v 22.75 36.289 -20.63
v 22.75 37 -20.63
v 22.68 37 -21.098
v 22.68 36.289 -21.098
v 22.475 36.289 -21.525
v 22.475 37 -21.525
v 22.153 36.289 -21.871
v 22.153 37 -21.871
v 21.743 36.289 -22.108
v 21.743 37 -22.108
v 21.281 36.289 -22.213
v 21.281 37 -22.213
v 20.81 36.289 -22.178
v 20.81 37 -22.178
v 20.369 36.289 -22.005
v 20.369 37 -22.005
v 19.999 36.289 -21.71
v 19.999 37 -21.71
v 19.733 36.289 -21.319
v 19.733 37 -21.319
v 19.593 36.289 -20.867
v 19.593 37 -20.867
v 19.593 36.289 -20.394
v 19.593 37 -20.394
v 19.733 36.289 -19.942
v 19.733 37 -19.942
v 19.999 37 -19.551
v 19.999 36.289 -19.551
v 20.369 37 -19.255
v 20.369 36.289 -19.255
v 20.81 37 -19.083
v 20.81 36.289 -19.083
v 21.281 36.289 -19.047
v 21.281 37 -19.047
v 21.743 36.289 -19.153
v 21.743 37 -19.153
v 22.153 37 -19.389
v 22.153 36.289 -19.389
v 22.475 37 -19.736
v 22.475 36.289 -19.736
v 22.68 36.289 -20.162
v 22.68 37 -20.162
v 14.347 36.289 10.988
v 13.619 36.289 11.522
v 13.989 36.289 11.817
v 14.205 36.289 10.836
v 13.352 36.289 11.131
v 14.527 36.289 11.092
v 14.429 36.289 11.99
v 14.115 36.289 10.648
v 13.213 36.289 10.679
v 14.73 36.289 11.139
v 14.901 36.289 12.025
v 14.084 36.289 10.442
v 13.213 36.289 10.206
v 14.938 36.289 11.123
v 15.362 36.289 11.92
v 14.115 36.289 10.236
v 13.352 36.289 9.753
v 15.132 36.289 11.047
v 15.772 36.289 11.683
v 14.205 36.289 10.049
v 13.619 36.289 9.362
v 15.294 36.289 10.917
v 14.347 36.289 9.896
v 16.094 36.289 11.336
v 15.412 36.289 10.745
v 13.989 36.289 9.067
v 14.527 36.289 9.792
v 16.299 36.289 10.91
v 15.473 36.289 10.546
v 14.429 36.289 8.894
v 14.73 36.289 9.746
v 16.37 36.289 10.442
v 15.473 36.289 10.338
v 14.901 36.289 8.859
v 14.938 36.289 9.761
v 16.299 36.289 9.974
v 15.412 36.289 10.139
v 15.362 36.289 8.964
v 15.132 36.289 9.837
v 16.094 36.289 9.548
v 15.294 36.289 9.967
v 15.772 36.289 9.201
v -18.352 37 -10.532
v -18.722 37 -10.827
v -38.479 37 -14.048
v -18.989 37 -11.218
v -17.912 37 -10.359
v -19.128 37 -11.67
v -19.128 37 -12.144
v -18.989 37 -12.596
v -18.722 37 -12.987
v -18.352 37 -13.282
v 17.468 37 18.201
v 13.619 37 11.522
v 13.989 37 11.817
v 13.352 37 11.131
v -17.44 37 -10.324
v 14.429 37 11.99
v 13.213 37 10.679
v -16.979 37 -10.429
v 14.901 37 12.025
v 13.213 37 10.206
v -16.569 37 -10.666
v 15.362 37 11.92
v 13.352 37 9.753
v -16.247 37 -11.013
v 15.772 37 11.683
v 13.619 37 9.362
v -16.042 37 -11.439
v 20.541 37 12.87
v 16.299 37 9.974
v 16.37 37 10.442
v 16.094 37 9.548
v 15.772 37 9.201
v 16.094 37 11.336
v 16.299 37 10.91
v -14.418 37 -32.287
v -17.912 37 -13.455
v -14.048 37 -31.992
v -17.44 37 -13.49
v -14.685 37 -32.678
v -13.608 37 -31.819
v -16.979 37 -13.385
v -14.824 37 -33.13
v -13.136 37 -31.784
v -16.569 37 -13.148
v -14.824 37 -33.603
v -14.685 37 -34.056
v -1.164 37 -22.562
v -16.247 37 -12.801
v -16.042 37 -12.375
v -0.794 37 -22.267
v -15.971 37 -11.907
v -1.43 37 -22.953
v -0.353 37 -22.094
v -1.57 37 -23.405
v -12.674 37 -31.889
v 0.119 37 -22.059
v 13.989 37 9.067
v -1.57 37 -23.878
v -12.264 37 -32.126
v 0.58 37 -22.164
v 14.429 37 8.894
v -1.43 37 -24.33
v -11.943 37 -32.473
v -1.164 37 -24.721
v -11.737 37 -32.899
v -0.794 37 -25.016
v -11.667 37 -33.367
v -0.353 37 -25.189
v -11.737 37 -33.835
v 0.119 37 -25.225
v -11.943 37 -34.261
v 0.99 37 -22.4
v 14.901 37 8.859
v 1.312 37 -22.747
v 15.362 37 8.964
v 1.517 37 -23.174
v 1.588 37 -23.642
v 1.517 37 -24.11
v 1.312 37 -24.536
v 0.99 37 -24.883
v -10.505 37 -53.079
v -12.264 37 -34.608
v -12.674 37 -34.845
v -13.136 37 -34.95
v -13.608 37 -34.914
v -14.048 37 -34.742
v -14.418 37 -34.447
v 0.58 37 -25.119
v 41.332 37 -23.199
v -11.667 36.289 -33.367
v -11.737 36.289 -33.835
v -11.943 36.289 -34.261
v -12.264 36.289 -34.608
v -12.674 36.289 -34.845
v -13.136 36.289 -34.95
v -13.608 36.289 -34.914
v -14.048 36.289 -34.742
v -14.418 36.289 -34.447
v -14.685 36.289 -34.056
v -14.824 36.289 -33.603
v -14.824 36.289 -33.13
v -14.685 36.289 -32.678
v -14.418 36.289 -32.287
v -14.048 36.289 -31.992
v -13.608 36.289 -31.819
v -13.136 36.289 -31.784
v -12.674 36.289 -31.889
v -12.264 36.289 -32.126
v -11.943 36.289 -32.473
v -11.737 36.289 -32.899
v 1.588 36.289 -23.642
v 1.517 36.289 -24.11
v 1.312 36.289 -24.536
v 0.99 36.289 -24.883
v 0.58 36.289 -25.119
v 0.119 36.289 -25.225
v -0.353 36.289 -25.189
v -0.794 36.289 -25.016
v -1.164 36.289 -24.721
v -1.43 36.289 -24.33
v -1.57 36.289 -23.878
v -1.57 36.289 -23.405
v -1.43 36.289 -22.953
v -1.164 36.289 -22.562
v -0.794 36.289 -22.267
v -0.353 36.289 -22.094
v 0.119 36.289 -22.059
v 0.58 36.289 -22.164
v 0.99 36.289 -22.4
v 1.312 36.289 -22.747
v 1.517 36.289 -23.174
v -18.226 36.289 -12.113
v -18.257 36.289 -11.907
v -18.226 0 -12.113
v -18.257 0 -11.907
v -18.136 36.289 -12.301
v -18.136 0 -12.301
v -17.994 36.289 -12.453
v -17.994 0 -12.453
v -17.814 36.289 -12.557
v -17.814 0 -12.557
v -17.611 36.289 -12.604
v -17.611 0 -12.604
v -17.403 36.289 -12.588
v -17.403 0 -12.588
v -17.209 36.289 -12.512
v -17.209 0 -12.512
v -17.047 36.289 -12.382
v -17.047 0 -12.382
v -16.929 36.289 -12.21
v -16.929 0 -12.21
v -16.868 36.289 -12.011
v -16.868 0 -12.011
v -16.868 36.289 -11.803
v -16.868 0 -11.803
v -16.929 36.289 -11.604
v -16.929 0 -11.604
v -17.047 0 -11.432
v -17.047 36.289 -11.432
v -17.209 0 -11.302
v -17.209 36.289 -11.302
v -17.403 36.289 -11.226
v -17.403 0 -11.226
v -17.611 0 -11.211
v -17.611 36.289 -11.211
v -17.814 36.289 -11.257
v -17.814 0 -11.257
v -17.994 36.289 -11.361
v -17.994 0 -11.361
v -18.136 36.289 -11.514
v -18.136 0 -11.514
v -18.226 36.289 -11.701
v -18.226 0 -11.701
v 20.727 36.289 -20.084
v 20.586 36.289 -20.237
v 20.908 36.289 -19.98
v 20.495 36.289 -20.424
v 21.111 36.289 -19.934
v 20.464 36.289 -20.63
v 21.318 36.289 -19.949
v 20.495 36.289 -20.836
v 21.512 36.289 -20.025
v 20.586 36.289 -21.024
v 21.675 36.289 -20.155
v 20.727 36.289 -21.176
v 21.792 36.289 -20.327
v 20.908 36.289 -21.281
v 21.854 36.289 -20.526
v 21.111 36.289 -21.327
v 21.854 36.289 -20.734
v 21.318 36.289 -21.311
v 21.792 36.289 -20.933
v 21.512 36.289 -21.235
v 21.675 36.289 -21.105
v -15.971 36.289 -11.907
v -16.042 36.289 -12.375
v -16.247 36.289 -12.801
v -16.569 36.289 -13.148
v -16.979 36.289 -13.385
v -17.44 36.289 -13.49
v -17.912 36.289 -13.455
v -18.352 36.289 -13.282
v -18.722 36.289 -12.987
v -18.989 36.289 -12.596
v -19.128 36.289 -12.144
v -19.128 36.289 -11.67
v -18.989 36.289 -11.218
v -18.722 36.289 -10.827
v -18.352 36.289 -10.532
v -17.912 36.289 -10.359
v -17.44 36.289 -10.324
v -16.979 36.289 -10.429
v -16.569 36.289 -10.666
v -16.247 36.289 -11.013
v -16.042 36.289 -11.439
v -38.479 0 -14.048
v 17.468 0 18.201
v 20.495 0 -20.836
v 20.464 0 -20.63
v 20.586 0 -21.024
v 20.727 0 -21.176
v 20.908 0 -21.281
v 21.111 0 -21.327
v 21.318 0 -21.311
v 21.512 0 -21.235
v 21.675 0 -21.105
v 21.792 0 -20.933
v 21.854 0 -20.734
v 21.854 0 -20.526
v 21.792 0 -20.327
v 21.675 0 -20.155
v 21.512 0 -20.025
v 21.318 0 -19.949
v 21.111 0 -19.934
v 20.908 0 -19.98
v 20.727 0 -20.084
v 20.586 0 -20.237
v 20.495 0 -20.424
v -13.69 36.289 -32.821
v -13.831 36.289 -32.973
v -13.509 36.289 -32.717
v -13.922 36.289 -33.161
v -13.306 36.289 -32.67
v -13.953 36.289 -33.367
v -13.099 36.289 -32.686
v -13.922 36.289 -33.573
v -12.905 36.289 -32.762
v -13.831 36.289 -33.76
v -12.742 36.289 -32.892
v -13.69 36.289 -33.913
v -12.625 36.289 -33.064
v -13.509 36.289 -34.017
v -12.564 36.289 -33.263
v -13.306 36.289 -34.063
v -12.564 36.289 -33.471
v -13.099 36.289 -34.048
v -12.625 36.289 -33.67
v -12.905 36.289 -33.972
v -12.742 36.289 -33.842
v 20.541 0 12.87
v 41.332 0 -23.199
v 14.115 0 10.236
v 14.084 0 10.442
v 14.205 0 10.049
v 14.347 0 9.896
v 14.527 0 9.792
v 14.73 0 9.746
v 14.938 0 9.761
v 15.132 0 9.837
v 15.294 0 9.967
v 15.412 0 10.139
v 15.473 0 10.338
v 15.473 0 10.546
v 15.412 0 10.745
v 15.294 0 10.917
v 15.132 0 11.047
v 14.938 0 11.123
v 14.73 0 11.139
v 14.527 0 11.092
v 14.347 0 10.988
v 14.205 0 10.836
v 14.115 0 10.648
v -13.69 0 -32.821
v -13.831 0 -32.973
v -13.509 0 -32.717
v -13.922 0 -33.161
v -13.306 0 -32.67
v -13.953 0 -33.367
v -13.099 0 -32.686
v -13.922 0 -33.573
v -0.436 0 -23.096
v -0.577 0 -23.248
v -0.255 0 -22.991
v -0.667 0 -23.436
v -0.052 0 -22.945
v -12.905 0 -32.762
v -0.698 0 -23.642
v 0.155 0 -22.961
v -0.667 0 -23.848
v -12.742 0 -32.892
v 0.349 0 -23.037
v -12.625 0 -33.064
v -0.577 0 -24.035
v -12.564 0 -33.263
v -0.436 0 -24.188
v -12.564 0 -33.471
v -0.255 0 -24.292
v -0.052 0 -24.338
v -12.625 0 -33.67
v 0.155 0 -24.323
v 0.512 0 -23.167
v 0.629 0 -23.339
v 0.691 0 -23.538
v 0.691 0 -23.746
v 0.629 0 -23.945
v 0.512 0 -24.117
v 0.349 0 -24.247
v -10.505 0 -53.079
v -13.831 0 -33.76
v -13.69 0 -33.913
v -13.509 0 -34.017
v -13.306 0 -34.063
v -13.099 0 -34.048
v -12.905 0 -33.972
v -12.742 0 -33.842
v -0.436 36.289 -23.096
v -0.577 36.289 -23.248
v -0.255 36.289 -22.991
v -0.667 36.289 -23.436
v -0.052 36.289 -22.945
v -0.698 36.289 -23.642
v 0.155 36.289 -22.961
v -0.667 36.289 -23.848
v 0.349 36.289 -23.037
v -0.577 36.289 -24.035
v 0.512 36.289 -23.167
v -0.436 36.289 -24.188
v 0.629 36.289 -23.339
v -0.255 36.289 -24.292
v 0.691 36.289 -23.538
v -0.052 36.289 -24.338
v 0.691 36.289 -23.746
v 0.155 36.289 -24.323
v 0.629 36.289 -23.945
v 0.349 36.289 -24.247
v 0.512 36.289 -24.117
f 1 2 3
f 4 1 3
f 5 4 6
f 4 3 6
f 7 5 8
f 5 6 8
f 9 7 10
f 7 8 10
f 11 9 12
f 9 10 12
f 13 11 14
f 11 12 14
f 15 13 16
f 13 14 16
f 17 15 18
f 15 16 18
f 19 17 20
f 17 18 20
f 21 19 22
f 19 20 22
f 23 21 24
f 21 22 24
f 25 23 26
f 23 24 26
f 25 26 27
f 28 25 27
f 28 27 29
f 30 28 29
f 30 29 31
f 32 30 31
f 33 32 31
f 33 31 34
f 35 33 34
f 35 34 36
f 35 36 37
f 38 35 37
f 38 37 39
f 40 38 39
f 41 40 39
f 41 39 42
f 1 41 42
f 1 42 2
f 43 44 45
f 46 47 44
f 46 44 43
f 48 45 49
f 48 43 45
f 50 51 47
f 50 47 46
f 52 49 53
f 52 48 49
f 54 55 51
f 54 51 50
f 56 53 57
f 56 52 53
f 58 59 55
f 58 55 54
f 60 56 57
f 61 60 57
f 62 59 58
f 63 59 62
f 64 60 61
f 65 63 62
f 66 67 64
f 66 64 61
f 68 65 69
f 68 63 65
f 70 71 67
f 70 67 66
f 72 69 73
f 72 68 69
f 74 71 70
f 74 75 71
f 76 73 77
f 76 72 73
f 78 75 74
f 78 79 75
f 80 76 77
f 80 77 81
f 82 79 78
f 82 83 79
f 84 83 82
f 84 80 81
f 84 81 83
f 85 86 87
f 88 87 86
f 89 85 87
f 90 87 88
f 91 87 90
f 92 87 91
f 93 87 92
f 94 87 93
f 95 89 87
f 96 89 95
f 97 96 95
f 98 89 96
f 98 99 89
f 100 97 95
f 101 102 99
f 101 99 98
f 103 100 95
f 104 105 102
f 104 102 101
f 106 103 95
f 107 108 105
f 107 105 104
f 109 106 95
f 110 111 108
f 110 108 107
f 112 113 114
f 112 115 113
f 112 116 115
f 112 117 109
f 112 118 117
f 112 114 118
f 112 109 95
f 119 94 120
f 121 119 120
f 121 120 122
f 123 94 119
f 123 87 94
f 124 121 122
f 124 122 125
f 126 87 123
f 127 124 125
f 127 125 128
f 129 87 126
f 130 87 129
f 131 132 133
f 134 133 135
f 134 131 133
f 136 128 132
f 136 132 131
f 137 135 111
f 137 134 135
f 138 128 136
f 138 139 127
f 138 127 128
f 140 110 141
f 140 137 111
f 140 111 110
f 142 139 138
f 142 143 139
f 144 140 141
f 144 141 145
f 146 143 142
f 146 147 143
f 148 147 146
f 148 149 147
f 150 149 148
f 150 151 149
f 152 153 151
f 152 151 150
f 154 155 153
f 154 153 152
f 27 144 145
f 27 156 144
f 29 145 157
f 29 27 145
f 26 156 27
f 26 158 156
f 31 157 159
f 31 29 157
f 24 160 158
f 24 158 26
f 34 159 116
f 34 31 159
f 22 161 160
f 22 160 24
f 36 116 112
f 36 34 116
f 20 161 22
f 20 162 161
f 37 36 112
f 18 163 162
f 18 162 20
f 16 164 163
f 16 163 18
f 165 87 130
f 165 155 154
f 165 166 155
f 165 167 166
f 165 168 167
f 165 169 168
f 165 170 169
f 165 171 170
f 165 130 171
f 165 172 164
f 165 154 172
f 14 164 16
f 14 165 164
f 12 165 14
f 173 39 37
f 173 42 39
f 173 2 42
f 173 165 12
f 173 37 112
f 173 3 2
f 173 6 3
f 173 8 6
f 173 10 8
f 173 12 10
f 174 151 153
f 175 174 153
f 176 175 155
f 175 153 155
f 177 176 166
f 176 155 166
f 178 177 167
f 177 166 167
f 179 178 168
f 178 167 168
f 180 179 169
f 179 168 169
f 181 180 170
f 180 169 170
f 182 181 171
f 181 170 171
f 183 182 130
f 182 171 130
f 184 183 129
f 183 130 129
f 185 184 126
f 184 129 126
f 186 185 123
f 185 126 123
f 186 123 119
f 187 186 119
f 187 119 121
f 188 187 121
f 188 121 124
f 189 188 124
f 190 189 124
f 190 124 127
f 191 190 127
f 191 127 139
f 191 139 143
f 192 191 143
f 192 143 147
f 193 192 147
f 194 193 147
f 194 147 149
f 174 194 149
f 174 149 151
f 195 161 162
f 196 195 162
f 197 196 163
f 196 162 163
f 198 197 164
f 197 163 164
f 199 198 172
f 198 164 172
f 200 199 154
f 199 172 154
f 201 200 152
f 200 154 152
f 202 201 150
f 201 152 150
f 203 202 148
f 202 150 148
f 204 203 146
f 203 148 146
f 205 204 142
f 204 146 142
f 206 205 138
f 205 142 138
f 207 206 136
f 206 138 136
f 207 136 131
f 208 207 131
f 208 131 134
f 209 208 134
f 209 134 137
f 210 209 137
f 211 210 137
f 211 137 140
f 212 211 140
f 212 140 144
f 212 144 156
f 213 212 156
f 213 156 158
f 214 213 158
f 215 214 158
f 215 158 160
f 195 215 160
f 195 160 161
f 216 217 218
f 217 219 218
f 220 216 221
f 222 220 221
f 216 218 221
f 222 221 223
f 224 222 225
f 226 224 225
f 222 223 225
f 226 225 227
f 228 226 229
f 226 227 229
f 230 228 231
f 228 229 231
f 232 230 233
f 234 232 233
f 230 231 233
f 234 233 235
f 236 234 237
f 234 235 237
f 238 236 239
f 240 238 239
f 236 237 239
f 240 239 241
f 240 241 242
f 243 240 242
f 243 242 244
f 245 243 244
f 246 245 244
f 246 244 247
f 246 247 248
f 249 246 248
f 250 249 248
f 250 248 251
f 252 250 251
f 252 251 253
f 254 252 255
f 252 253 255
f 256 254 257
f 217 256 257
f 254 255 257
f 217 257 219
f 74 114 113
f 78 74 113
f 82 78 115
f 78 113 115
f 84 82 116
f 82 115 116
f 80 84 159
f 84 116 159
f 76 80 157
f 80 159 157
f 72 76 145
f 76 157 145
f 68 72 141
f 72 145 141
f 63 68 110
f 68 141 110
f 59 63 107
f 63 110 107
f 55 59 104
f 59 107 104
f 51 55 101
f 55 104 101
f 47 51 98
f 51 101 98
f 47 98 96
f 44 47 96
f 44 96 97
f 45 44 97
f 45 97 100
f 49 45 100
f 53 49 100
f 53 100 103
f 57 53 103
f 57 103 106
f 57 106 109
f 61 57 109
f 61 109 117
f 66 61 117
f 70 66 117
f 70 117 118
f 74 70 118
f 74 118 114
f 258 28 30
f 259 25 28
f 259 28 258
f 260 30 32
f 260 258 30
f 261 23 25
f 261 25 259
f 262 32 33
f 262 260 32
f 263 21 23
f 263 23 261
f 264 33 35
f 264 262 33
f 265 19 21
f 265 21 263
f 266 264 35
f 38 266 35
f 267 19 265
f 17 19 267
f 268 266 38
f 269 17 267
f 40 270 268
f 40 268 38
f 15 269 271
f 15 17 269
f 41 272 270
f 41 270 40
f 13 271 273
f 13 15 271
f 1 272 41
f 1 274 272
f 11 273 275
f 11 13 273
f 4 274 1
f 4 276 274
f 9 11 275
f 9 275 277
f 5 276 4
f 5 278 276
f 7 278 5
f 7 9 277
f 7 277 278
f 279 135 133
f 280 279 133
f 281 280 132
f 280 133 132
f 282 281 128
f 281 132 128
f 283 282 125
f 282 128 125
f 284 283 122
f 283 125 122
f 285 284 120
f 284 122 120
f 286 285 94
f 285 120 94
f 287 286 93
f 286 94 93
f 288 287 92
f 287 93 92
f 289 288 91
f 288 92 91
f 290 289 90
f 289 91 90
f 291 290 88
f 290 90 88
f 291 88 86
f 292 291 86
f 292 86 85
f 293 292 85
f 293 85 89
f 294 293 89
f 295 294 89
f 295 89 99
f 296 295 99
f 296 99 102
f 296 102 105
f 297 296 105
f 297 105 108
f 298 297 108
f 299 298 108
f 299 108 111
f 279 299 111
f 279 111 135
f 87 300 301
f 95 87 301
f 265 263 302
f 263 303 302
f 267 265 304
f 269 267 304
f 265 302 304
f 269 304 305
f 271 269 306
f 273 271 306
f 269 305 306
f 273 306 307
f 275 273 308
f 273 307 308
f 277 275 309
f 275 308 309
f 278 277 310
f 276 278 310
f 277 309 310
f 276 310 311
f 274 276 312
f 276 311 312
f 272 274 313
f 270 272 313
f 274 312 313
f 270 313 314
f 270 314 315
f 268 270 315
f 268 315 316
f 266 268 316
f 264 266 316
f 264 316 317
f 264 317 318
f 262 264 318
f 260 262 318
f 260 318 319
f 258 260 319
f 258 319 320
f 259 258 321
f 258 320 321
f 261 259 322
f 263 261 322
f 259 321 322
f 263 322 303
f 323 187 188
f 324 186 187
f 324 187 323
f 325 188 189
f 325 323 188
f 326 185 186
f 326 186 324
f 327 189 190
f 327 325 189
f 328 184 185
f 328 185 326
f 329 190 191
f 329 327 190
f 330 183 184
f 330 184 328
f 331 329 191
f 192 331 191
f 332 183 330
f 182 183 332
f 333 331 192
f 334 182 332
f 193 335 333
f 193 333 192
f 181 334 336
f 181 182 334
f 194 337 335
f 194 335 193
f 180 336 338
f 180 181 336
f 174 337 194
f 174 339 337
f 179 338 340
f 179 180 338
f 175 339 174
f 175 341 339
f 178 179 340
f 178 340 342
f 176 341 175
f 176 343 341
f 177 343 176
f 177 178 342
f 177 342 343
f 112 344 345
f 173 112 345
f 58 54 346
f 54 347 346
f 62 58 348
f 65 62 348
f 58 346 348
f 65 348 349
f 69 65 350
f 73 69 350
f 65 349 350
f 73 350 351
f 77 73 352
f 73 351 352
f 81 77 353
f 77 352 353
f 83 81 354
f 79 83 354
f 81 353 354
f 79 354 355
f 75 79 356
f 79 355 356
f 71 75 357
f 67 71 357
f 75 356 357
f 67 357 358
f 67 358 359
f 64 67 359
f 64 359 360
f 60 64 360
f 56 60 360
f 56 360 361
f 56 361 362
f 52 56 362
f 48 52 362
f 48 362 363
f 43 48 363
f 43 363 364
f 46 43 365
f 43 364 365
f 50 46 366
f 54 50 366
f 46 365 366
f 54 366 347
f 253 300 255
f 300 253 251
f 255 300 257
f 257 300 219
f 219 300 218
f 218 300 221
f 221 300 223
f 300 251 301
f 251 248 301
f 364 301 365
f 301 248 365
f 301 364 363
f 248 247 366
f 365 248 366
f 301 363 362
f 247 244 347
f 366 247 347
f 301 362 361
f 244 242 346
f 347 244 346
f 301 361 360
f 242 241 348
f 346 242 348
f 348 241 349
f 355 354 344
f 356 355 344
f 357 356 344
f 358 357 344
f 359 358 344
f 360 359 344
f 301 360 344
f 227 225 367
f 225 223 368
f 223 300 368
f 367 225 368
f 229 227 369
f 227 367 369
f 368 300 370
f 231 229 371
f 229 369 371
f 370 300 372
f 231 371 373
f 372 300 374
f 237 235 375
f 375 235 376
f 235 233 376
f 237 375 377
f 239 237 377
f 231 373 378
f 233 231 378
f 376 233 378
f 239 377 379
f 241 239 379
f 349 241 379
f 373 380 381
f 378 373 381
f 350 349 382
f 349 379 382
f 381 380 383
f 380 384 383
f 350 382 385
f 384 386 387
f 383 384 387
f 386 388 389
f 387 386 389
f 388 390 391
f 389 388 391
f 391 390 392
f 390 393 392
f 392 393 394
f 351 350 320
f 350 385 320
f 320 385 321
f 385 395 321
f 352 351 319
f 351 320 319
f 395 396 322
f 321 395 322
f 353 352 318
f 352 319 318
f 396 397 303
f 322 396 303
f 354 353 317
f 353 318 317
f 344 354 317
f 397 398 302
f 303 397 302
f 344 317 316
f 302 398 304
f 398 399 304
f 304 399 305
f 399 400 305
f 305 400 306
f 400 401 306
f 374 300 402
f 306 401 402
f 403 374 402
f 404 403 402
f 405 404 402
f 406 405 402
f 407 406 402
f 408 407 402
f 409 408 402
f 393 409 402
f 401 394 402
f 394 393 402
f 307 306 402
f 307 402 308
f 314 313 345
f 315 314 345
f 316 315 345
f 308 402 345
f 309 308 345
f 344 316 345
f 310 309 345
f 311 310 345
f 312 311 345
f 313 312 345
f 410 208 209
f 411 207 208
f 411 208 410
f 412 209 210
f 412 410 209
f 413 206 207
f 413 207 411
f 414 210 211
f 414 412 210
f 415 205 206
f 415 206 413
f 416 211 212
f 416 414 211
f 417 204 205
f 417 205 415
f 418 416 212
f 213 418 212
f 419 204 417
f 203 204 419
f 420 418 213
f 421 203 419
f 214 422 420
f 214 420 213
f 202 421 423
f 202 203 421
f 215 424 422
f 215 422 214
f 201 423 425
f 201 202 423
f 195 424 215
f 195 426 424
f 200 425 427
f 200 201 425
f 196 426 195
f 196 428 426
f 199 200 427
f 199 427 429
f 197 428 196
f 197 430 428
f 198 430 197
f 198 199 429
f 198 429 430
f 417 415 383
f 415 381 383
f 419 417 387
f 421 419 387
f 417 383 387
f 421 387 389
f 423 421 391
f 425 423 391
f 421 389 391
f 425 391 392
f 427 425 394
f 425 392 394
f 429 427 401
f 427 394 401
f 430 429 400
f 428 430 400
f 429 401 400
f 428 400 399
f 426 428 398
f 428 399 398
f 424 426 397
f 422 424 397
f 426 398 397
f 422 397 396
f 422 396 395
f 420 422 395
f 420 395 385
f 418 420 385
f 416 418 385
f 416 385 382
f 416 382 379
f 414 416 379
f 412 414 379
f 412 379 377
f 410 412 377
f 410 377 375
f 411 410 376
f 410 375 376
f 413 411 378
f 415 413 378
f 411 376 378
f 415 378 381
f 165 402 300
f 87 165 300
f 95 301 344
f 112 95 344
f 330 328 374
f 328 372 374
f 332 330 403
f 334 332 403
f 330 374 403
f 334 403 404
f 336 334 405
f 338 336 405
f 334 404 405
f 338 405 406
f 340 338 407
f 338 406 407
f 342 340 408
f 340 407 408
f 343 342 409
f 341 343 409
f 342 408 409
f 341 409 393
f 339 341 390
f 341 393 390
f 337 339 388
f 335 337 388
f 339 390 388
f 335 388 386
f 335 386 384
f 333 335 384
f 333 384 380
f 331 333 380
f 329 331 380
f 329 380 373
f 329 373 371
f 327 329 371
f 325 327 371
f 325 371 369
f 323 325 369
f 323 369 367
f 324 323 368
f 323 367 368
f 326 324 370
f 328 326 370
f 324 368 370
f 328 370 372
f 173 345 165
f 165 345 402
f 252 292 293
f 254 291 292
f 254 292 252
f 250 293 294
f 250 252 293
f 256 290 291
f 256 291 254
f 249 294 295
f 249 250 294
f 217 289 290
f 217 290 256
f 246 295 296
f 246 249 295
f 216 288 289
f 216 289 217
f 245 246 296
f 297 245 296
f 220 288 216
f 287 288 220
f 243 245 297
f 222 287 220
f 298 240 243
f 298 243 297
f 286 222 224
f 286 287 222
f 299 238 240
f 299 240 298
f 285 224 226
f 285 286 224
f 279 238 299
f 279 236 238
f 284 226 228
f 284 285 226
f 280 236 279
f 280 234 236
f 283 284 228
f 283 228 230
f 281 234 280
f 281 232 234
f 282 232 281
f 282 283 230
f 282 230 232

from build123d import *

# Parameters (mm, degrees)
BOSS_EXTRUDE1_DEPTH                                 = 37
CBORE_FOR_00_BINDING_HEAD_MACHINE_SCREW_D           = 1.397
CBORE_FOR_00_BINDING_HEAD_MACHINE_SCREW_CBORE_D     = 3.175
CBORE_FOR_00_BINDING_HEAD_MACHINE_SCREW_CBORE_DEPTH = 0.7112


with BuildPart() as part:
    # Sketch1 → Boss-Extrude1 (new body)
    with BuildSketch(Plane(origin=(0, 0, 0), x_dir=(1, 0, 0), z_dir=(0, 1, 0))):
        Polygon((-10.505392469, 53.079063556), (-38.479053813, 14.047908535), (17.468268874, -18.201203232), (20.541085549, -12.870331878), (41.33210383, 23.198934685), align=None)
    extrude(amount=BOSS_EXTRUDE1_DEPTH)

    # CBORE for #00 Binding Head Machine Screw1 (through all)
    with Locations(Plane(origin=(0, 37, 0), x_dir=(1, 0, 0), z_dir=(0, 1, 0))):
        with Locations((14.7823041, -10.442137487), (0, 23.641654167), (21.162859004, 20.630300354), (-17.558591277, 11.907077475), (-13.254255948, 33.366792883)):
            CounterBoreHole(CBORE_FOR_00_BINDING_HEAD_MACHINE_SCREW_D / 2, CBORE_FOR_00_BINDING_HEAD_MACHINE_SCREW_CBORE_D / 2, CBORE_FOR_00_BINDING_HEAD_MACHINE_SCREW_CBORE_DEPTH)


solid = part.part
